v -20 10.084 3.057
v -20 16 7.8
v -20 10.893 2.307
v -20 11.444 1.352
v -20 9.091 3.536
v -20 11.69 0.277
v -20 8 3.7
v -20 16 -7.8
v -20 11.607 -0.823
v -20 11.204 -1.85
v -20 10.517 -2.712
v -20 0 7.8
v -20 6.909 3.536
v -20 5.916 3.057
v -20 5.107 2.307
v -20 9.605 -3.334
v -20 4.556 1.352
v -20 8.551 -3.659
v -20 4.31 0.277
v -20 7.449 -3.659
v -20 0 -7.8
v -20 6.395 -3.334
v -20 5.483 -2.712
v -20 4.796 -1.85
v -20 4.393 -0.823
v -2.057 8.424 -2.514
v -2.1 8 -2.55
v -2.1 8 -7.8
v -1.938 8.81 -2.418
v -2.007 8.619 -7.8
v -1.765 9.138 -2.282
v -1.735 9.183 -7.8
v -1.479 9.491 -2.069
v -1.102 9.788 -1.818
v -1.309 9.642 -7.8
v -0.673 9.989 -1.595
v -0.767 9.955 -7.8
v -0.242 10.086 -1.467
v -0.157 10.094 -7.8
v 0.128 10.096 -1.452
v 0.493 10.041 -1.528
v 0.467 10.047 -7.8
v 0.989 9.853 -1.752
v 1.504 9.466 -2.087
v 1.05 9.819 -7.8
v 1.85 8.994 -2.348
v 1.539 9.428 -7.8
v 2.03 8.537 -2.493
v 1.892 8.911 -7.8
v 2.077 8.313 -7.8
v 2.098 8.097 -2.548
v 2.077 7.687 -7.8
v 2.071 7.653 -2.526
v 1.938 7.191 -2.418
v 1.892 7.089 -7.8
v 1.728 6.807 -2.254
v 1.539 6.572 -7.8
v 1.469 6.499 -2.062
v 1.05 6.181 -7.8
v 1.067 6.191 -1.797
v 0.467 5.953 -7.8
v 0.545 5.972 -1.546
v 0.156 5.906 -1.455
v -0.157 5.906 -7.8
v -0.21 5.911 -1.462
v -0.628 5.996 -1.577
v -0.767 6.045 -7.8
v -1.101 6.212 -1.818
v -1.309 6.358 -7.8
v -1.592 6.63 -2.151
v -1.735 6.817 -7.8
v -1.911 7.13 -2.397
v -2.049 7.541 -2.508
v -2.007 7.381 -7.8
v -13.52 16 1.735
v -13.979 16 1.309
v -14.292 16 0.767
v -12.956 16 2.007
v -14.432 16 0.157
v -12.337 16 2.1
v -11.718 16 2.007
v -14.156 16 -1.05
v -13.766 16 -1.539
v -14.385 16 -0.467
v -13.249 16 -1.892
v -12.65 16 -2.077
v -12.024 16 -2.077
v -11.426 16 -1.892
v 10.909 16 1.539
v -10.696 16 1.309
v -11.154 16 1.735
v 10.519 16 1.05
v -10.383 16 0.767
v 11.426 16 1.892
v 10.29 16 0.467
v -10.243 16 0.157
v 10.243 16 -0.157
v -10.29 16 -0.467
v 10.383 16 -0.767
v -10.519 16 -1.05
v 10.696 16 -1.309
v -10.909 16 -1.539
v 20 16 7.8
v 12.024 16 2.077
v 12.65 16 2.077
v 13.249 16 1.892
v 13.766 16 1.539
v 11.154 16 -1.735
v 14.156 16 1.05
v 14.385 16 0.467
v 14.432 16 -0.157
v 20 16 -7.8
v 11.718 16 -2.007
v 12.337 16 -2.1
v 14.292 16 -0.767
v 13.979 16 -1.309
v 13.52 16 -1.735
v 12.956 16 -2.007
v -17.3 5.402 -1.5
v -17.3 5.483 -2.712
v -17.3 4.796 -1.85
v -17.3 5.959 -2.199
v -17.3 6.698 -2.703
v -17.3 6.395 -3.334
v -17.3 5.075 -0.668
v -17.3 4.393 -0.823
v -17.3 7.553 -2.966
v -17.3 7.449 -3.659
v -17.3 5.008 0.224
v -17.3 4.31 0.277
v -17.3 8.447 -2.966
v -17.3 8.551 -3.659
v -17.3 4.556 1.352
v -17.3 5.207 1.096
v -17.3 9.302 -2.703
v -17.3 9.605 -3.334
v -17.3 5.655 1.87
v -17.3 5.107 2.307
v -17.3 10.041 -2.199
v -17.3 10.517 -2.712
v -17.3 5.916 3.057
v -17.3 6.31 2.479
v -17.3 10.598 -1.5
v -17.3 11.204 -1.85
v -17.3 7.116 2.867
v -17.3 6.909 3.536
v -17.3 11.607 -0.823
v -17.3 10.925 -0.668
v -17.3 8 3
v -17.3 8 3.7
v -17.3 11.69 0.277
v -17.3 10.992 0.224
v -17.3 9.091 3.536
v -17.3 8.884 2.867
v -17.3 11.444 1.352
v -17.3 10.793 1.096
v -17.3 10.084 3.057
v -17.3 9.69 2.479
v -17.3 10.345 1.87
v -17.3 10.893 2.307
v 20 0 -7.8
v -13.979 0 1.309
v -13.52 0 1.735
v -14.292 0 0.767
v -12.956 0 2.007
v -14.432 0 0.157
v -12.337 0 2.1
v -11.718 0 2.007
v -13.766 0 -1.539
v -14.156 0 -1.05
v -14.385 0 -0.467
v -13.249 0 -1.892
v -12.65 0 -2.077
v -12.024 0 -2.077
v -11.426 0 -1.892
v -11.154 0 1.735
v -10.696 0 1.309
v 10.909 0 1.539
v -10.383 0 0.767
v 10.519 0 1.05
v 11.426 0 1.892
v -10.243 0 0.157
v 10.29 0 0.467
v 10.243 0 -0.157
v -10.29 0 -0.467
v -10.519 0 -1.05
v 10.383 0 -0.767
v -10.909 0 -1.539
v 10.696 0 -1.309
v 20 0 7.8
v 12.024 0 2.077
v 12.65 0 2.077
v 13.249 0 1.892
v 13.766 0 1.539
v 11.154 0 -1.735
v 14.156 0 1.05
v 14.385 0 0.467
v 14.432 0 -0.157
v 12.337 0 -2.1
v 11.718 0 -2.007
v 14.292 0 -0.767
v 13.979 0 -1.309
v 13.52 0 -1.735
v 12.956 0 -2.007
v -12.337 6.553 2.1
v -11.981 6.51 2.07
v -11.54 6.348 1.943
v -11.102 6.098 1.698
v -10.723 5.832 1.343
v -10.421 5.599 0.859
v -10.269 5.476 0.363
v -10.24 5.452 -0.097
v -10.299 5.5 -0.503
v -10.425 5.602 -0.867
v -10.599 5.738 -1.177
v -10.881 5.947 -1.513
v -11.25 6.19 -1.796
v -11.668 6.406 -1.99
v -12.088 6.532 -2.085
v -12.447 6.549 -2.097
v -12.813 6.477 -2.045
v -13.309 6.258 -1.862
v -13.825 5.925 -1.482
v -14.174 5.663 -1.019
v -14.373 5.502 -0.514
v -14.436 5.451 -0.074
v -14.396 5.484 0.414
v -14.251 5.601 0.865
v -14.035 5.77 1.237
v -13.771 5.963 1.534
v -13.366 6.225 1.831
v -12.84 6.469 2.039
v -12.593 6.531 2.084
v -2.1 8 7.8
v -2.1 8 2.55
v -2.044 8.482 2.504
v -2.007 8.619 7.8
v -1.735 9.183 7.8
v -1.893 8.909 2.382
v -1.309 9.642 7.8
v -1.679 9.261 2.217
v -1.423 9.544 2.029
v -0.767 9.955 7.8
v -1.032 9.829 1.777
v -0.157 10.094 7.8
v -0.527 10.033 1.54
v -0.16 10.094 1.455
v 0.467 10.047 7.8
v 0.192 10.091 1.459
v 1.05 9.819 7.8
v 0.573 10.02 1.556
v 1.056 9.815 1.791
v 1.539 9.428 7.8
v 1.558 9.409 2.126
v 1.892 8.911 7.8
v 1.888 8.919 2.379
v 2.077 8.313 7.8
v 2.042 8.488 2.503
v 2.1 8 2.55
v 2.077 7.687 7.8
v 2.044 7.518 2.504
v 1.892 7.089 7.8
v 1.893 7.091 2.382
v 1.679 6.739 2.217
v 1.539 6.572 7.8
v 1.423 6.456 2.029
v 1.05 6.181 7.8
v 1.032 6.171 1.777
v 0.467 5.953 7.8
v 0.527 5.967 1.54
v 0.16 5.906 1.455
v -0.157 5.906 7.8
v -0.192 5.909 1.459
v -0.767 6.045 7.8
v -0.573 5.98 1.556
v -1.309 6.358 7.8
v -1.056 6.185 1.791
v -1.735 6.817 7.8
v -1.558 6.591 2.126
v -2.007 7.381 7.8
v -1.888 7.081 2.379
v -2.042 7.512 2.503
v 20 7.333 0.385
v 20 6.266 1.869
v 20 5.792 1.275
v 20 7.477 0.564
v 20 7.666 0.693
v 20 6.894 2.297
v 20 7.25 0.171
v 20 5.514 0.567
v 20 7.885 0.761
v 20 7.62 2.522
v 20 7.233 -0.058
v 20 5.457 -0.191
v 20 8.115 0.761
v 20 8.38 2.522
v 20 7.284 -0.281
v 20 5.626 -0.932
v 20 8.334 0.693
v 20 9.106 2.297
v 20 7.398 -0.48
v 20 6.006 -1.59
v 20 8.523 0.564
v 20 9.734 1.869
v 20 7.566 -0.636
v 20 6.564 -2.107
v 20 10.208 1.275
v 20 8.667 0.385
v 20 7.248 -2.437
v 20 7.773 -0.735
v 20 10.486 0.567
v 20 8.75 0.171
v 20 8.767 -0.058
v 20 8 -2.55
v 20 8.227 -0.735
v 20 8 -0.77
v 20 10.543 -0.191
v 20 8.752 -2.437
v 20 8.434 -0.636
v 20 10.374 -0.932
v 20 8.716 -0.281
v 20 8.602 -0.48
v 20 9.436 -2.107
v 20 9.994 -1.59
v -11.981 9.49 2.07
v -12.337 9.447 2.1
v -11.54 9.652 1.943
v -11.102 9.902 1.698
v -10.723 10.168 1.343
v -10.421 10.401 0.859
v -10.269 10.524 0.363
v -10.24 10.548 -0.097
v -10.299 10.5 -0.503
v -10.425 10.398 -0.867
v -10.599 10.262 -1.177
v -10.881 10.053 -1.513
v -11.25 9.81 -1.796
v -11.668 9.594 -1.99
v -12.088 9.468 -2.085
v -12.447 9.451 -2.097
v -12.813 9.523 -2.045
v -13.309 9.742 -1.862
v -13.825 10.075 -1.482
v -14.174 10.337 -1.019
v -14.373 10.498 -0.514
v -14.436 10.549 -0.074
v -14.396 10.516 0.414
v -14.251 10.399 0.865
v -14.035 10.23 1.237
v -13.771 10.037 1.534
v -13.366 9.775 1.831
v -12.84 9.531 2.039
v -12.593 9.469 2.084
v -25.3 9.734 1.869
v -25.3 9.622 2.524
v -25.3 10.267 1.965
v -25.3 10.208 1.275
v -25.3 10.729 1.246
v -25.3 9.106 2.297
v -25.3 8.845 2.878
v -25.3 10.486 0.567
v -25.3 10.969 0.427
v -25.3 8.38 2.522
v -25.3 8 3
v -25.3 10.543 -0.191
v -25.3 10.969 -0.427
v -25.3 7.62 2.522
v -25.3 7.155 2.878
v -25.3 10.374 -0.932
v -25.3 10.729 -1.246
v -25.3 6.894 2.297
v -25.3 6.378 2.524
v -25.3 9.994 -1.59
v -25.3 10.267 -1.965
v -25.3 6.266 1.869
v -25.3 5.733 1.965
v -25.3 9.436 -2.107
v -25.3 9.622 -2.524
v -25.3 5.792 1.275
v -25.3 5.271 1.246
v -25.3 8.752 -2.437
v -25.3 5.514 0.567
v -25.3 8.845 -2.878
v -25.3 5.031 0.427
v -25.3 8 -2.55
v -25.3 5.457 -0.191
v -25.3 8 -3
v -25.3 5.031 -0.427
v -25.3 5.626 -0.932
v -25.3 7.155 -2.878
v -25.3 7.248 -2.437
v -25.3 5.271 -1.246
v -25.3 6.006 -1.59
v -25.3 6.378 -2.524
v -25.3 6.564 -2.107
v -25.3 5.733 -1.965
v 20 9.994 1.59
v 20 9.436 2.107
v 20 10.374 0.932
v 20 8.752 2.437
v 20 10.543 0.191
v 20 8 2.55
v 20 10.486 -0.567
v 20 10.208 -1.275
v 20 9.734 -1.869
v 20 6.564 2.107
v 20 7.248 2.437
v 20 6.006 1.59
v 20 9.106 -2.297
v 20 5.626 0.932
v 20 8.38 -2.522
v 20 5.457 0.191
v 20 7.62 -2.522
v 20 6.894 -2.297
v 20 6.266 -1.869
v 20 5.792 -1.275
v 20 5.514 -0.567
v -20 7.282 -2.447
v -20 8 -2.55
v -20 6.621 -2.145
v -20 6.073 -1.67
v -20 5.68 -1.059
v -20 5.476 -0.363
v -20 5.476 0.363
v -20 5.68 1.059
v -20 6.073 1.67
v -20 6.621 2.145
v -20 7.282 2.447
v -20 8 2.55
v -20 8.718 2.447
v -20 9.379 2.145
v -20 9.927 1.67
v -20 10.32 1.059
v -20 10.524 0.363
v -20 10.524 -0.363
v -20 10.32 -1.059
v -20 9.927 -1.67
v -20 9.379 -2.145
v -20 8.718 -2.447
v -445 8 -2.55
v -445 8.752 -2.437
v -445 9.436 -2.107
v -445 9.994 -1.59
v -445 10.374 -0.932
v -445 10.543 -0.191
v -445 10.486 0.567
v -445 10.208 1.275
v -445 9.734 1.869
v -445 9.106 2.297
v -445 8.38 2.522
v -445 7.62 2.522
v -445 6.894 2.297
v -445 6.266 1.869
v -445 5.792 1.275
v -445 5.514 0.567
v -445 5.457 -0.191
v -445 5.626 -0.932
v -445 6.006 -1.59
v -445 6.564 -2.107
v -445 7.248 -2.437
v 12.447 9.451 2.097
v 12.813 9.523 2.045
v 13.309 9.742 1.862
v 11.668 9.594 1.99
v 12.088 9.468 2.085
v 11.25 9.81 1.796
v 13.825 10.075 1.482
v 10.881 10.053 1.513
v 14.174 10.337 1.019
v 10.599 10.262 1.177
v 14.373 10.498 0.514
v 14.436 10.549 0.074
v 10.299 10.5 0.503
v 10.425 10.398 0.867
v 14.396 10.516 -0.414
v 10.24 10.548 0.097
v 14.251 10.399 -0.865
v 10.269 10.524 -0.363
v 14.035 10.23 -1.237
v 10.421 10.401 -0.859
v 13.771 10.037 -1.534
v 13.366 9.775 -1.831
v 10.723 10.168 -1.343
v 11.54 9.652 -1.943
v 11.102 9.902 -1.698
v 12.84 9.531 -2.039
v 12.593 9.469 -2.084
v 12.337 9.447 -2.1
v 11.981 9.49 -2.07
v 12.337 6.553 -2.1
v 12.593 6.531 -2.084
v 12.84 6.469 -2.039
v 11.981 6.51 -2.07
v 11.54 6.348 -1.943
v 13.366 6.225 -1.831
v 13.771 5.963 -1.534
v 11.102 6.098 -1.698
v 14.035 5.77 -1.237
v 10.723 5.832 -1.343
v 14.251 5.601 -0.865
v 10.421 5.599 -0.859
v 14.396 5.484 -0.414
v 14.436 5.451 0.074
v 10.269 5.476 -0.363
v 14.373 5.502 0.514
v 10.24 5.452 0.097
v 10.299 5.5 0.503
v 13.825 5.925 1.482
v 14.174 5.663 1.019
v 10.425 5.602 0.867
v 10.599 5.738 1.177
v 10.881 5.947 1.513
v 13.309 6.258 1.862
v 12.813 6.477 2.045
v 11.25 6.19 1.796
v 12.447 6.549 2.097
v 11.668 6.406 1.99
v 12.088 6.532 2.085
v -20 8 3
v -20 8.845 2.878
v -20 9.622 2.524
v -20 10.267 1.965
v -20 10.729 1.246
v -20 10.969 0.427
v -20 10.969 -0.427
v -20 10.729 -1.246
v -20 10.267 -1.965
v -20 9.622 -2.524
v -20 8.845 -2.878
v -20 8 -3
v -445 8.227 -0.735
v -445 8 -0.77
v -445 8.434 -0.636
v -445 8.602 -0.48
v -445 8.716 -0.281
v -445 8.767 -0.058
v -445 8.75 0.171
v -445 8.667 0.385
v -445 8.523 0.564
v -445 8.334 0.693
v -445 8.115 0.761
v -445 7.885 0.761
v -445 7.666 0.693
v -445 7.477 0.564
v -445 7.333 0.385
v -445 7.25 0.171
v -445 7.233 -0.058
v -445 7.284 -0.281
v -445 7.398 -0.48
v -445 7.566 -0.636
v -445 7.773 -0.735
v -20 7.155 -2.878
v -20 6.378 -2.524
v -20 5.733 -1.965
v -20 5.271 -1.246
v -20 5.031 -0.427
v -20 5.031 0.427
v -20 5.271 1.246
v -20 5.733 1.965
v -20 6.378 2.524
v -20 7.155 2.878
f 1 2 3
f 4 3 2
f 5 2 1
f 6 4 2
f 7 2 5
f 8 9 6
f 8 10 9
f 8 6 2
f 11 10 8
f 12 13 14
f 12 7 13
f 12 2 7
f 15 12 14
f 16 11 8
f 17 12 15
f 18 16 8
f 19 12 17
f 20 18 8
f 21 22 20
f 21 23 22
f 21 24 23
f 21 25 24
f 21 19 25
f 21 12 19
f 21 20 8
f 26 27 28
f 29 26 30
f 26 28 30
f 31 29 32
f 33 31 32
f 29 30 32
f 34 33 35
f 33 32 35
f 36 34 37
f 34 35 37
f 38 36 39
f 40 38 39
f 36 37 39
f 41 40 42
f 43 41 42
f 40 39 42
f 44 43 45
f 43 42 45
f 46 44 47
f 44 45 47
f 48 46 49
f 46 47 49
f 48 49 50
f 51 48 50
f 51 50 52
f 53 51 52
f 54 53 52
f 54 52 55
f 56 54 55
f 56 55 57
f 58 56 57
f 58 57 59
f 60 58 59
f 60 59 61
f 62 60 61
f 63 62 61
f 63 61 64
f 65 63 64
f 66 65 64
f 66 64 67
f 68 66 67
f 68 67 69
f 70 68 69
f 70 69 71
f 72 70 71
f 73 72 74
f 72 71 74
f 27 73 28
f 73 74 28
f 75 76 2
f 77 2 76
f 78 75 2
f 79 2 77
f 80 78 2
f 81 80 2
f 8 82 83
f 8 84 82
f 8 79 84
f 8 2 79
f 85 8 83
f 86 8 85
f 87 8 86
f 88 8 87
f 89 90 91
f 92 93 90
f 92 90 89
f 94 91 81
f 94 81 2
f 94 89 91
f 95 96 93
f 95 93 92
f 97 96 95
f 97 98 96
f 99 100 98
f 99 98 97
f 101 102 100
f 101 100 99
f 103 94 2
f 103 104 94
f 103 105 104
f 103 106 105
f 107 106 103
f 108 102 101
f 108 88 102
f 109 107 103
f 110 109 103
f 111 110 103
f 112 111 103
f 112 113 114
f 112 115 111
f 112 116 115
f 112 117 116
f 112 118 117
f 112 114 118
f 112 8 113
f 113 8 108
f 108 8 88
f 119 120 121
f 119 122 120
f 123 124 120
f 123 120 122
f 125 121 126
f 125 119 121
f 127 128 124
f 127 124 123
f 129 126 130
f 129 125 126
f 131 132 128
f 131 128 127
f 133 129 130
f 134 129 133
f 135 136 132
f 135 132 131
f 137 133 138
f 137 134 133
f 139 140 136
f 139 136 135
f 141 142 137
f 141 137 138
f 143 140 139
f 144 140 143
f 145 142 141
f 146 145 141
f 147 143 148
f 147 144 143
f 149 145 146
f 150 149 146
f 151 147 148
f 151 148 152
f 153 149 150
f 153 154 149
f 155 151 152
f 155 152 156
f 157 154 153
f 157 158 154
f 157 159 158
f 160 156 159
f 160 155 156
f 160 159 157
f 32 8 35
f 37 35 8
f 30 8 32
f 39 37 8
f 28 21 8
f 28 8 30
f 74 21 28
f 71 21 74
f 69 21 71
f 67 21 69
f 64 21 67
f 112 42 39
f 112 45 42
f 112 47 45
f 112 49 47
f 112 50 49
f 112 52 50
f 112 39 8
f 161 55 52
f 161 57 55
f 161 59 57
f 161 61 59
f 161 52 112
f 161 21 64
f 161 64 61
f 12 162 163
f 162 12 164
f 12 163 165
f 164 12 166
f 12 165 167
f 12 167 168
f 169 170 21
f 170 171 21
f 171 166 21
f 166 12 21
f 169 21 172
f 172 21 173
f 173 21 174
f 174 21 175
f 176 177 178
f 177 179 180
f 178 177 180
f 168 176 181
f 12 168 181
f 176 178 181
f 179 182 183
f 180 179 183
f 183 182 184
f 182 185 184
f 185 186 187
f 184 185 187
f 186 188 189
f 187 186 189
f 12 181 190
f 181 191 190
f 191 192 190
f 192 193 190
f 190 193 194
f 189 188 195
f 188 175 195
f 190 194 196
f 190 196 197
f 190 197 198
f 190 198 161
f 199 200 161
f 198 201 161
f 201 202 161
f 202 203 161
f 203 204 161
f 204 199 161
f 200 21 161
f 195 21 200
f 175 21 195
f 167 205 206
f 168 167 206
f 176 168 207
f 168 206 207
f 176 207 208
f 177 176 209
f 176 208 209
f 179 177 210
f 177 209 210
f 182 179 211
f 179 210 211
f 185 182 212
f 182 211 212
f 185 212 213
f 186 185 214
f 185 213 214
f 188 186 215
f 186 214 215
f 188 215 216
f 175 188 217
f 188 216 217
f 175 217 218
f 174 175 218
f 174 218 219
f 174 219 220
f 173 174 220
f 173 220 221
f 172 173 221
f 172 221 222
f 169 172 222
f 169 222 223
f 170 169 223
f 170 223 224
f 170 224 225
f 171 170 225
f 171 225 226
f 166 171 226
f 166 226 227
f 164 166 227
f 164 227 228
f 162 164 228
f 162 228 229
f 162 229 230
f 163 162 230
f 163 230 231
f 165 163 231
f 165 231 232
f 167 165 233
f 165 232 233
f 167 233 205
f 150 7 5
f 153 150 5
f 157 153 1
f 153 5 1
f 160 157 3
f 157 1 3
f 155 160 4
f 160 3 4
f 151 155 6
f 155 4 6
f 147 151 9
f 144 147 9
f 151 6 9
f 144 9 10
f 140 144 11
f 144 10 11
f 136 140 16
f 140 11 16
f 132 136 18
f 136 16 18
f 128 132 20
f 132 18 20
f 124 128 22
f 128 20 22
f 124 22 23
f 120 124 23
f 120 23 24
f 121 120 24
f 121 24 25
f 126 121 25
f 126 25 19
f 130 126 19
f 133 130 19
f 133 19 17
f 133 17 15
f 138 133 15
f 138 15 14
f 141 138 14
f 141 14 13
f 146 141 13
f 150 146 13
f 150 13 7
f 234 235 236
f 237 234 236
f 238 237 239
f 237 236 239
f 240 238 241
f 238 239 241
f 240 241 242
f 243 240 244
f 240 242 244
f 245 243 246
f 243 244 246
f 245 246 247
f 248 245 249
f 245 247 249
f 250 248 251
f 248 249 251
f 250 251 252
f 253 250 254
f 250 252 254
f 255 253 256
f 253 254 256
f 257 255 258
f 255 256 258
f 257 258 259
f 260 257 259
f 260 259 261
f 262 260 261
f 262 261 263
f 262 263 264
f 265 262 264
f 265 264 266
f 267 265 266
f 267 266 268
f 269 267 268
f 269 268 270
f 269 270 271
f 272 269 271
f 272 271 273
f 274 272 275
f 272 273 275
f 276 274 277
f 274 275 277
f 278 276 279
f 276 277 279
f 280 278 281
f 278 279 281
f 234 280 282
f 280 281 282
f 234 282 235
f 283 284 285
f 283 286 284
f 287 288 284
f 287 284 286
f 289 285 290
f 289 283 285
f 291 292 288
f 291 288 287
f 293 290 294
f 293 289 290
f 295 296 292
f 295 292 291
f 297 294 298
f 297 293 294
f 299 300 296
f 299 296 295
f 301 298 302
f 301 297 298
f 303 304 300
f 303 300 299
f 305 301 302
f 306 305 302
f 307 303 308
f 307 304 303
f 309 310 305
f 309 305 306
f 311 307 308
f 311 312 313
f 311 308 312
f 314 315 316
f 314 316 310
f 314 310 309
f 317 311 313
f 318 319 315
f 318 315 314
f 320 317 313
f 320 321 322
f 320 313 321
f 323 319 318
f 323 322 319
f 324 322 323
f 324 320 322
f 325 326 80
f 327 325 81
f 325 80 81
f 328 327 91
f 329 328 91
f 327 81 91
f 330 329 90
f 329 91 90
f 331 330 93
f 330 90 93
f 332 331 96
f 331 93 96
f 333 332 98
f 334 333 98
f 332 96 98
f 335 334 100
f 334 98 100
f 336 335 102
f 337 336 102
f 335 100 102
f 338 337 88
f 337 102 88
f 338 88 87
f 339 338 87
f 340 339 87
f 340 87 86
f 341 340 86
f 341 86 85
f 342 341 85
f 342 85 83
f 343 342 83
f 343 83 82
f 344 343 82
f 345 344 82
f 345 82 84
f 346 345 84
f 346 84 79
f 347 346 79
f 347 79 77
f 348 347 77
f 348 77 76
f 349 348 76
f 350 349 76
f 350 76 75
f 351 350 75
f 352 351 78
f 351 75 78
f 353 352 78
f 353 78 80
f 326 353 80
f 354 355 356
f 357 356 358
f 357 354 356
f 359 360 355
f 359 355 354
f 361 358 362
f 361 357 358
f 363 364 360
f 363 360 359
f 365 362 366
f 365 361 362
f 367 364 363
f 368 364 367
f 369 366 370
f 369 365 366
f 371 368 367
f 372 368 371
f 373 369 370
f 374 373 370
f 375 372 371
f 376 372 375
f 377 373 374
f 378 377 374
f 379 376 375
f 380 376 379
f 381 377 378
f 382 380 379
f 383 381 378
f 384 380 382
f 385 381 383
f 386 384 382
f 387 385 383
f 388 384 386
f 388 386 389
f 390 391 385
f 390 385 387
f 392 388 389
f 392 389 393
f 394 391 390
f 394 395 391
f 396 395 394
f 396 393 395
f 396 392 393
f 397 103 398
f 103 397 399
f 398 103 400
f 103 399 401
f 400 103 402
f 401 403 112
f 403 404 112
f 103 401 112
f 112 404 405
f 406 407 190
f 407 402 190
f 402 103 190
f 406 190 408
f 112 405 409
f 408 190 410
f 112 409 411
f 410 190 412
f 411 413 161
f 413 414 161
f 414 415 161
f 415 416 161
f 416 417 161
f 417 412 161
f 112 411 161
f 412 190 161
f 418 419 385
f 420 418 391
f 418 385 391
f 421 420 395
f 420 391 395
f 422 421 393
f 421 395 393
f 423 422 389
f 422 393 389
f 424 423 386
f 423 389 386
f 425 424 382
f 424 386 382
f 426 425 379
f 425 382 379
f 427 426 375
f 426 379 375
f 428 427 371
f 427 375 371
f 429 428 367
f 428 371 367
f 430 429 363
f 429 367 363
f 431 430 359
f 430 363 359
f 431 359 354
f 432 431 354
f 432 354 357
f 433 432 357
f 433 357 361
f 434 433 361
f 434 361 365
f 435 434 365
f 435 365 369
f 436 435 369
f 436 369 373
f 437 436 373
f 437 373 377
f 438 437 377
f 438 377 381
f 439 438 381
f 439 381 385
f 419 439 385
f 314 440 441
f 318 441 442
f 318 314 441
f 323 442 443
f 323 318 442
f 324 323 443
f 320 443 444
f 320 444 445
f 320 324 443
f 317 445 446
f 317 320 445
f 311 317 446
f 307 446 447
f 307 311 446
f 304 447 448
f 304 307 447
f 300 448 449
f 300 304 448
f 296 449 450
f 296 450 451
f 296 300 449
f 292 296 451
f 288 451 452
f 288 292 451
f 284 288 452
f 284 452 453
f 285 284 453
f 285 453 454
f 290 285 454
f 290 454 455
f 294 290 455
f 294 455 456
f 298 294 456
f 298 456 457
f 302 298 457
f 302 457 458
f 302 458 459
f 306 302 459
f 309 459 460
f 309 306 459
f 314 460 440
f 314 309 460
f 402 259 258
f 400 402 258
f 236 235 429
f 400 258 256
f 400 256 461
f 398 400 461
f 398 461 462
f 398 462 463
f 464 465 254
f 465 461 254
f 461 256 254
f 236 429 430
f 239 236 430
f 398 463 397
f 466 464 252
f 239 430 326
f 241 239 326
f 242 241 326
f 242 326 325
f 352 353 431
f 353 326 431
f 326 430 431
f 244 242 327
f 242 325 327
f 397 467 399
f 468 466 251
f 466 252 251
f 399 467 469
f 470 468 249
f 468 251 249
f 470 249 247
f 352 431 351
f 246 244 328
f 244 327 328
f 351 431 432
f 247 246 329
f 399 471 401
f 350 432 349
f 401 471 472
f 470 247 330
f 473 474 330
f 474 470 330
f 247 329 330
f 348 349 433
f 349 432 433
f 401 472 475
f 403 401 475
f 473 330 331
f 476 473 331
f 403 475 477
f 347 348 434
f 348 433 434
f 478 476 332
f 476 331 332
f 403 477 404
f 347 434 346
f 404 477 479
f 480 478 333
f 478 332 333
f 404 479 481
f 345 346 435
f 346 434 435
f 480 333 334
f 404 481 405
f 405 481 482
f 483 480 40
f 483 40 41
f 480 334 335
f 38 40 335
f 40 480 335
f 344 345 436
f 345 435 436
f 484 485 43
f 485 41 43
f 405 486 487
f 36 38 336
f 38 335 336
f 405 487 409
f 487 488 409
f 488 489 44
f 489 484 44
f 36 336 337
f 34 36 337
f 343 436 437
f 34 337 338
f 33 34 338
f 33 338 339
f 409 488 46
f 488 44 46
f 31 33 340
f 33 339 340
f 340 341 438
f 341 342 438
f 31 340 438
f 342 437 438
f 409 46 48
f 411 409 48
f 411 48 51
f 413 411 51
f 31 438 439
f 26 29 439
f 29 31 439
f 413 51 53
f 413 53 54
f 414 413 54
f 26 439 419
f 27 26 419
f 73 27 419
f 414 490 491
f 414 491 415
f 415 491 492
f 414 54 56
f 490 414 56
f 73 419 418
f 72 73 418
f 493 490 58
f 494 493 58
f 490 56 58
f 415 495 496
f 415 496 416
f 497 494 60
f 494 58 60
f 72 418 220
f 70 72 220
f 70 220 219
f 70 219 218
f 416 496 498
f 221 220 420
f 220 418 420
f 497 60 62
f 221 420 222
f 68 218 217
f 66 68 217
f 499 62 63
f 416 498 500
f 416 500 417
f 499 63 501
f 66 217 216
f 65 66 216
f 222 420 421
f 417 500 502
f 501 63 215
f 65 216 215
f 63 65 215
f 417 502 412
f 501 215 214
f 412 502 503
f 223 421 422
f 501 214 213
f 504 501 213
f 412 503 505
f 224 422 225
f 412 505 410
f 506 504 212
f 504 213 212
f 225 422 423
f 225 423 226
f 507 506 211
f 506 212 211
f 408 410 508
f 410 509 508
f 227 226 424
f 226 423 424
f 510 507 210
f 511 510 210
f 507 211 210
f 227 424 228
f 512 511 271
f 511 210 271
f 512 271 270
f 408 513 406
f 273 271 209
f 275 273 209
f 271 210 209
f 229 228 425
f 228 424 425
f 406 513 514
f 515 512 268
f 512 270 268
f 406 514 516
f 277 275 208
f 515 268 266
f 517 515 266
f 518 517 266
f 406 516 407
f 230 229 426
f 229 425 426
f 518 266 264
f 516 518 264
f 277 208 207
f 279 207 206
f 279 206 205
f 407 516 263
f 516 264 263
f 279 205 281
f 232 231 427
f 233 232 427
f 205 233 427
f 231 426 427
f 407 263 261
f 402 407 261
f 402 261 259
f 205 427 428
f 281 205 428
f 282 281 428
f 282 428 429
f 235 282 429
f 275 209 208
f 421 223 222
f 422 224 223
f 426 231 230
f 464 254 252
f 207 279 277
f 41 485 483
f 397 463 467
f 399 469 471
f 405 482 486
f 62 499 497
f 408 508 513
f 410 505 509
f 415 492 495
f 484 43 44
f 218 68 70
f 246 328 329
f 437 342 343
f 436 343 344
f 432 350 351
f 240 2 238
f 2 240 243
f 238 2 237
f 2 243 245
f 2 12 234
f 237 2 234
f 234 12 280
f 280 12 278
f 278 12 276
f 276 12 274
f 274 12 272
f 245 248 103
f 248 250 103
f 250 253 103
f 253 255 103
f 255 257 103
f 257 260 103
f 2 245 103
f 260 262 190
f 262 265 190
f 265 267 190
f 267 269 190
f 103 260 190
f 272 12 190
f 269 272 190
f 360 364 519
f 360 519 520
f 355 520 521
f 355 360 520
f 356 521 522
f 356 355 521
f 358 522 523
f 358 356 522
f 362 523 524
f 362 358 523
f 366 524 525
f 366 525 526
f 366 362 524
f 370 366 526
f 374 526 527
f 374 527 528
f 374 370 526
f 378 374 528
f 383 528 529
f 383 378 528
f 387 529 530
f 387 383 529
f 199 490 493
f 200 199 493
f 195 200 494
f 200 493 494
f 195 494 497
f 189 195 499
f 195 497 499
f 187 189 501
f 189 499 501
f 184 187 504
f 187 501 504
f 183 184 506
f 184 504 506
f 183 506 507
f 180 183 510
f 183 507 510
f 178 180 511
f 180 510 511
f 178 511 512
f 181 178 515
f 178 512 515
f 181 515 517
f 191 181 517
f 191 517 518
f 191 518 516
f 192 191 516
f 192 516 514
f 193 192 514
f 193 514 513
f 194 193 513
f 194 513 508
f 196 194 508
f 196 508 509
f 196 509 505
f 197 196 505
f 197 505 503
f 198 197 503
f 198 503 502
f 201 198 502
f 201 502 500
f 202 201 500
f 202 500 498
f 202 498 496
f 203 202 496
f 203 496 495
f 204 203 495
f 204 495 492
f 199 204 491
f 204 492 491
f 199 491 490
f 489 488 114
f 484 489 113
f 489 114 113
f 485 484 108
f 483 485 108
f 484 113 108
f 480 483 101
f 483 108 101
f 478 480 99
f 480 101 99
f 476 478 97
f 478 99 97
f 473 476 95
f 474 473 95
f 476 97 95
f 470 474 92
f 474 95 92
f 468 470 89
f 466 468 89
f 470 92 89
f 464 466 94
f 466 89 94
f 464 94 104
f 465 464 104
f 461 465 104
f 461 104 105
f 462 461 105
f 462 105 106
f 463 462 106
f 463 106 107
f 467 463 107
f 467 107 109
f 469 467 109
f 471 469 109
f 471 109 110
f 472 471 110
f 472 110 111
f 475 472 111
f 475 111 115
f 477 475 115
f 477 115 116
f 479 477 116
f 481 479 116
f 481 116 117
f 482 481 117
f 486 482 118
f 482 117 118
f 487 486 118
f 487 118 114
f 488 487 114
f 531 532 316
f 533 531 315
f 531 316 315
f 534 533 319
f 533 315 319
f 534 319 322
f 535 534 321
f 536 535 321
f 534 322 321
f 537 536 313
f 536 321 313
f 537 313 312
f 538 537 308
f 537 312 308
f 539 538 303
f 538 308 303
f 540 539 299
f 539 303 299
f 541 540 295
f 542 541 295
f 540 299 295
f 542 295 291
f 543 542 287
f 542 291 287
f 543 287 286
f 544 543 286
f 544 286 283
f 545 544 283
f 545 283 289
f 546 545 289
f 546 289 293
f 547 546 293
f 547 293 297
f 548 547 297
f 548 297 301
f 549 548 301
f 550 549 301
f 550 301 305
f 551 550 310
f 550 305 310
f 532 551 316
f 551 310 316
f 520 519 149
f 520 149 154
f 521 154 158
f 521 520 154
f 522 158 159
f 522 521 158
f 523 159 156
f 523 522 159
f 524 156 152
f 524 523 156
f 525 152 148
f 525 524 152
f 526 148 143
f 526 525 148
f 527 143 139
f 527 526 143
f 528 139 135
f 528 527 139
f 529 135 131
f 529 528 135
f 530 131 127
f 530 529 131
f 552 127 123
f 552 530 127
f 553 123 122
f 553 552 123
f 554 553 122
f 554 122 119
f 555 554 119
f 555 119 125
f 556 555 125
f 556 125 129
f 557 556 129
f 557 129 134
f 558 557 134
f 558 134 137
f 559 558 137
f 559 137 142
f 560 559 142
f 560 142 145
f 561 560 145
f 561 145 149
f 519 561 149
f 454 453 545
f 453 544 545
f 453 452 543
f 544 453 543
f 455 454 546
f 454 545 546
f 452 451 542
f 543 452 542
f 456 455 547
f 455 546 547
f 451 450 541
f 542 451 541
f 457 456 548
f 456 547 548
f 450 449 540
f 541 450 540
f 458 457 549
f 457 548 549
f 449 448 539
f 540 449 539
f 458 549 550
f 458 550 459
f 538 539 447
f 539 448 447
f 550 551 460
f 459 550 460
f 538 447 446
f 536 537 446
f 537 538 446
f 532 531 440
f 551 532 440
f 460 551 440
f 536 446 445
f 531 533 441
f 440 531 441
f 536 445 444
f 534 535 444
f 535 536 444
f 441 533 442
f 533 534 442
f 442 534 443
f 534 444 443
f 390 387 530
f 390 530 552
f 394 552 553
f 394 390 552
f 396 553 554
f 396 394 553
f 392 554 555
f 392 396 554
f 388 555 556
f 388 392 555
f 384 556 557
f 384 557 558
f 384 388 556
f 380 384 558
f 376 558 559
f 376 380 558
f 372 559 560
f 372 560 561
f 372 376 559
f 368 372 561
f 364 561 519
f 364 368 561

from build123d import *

# Parameters (mm, degrees)
SKETCH_1_W          = 40
SKETCH_1_H          = 15.6
EXTRUDE_1_DEPTH     = 16
SKETCH_2_R          = 2.1
CUT_EXTRUDE_1_DEPTH = 27.773867857
SKETCH_3_R          = 2.55
CUT_EXTRUDE_2_DEPTH = 44.78173135
SKETCH_4_R          = 2.55
SKETCH_4_R_2        = 0.769637984
EXTRUDE_2_DEPTH     = 465
EXTRUDE_START       = 5.3
SKETCH_5_R          = 3
SKETCH_5_R_2        = 2.55
EXTRUDE_3_DEPTH     = 5.3
SKETCH_6_R          = 3.7
SKETCH_6_R_2        = 3
CUT_EXTRUDE_3_DEPTH = 8
SKETCH_8_R          = 2.1
CUT_EXTRUDE_4_DEPTH = 446.560725382


with BuildPart() as part:
    # Эскиз1 → Бобышка-Вытянуть1 (new body)
    with BuildSketch(Plane(origin=(0, 0, 0), x_dir=(1, 0, 0), z_dir=(0, 1, 0))):
        Rectangle(SKETCH_1_W, SKETCH_1_H)
    extrude(amount=EXTRUDE_1_DEPTH)

    # Эскиз2 → Вырез-Вытянуть1 (cut, through all)
    with BuildSketch(Plane(origin=(0, 16, 0), x_dir=(1, 0, 0), z_dir=(0, 1, 0))):
        with Locations(Location((-12.337465342, 0, 0), (0, 0, 270))):
            Circle(SKETCH_2_R)
        with Locations(Location((12.337465342, 0, 0), (0, 0, 90))):
            Circle(SKETCH_2_R)
    extrude(amount=-CUT_EXTRUDE_1_DEPTH, mode=Mode.SUBTRACT)

    # Эскиз3 → Вырез-Вытянуть2 (cut, through all)
    with BuildSketch(Plane.ZY.offset(20)):
        with Locations((0, 8)):
            Circle(SKETCH_3_R)
    extrude(amount=-CUT_EXTRUDE_2_DEPTH, mode=Mode.SUBTRACT)

    # Эскиз5 → Бобышка-Вытянуть3 (add)
    with BuildSketch(Plane.ZY.offset(20).offset(EXTRUDE_START)):
        with Locations(Location((0, 8, 0), (0, 0, 180))):
            Circle(SKETCH_5_R)
        with Locations(Location((0, 8, 0), (0, 0, 180))):
            Circle(SKETCH_5_R_2, mode=Mode.SUBTRACT)
    extrude(amount=-EXTRUDE_3_DEPTH)

    # Эскиз6 → Вырез-Вытянуть3 (cut)
    with BuildSketch(Plane.ZY.offset(25.3)):
        with Locations((0, 8)):
            Circle(SKETCH_6_R)
        with Locations((0, 8)):
            Circle(SKETCH_6_R_2, mode=Mode.SUBTRACT)
    extrude(amount=-CUT_EXTRUDE_3_DEPTH, mode=Mode.SUBTRACT)

    # Эскиз8 → Вырез-Вытянуть4 (cut, through all)
    with BuildSketch(Plane(origin=(0, 0, -7.8), x_dir=(-1, 0, 0), z_dir=(0, 0, -1))):
        with Locations((0, 8)):
            Circle(SKETCH_8_R)
    extrude(amount=-CUT_EXTRUDE_4_DEPTH, mode=Mode.SUBTRACT)


with BuildPart() as body_2:
    # Эскиз4 → Бобышка-Вытянуть2 (new body)
    with BuildSketch(Plane(origin=(20, 0, 0), x_dir=(0, 0, -1), z_dir=(1, 0, 0))):
        with Locations((0, 8)):
            Circle(SKETCH_4_R)
        with Locations((0, 8)):
            Circle(SKETCH_4_R_2, mode=Mode.SUBTRACT)
    extrude(amount=-EXTRUDE_2_DEPTH)


solid = Compound([part.part, body_2.part])
